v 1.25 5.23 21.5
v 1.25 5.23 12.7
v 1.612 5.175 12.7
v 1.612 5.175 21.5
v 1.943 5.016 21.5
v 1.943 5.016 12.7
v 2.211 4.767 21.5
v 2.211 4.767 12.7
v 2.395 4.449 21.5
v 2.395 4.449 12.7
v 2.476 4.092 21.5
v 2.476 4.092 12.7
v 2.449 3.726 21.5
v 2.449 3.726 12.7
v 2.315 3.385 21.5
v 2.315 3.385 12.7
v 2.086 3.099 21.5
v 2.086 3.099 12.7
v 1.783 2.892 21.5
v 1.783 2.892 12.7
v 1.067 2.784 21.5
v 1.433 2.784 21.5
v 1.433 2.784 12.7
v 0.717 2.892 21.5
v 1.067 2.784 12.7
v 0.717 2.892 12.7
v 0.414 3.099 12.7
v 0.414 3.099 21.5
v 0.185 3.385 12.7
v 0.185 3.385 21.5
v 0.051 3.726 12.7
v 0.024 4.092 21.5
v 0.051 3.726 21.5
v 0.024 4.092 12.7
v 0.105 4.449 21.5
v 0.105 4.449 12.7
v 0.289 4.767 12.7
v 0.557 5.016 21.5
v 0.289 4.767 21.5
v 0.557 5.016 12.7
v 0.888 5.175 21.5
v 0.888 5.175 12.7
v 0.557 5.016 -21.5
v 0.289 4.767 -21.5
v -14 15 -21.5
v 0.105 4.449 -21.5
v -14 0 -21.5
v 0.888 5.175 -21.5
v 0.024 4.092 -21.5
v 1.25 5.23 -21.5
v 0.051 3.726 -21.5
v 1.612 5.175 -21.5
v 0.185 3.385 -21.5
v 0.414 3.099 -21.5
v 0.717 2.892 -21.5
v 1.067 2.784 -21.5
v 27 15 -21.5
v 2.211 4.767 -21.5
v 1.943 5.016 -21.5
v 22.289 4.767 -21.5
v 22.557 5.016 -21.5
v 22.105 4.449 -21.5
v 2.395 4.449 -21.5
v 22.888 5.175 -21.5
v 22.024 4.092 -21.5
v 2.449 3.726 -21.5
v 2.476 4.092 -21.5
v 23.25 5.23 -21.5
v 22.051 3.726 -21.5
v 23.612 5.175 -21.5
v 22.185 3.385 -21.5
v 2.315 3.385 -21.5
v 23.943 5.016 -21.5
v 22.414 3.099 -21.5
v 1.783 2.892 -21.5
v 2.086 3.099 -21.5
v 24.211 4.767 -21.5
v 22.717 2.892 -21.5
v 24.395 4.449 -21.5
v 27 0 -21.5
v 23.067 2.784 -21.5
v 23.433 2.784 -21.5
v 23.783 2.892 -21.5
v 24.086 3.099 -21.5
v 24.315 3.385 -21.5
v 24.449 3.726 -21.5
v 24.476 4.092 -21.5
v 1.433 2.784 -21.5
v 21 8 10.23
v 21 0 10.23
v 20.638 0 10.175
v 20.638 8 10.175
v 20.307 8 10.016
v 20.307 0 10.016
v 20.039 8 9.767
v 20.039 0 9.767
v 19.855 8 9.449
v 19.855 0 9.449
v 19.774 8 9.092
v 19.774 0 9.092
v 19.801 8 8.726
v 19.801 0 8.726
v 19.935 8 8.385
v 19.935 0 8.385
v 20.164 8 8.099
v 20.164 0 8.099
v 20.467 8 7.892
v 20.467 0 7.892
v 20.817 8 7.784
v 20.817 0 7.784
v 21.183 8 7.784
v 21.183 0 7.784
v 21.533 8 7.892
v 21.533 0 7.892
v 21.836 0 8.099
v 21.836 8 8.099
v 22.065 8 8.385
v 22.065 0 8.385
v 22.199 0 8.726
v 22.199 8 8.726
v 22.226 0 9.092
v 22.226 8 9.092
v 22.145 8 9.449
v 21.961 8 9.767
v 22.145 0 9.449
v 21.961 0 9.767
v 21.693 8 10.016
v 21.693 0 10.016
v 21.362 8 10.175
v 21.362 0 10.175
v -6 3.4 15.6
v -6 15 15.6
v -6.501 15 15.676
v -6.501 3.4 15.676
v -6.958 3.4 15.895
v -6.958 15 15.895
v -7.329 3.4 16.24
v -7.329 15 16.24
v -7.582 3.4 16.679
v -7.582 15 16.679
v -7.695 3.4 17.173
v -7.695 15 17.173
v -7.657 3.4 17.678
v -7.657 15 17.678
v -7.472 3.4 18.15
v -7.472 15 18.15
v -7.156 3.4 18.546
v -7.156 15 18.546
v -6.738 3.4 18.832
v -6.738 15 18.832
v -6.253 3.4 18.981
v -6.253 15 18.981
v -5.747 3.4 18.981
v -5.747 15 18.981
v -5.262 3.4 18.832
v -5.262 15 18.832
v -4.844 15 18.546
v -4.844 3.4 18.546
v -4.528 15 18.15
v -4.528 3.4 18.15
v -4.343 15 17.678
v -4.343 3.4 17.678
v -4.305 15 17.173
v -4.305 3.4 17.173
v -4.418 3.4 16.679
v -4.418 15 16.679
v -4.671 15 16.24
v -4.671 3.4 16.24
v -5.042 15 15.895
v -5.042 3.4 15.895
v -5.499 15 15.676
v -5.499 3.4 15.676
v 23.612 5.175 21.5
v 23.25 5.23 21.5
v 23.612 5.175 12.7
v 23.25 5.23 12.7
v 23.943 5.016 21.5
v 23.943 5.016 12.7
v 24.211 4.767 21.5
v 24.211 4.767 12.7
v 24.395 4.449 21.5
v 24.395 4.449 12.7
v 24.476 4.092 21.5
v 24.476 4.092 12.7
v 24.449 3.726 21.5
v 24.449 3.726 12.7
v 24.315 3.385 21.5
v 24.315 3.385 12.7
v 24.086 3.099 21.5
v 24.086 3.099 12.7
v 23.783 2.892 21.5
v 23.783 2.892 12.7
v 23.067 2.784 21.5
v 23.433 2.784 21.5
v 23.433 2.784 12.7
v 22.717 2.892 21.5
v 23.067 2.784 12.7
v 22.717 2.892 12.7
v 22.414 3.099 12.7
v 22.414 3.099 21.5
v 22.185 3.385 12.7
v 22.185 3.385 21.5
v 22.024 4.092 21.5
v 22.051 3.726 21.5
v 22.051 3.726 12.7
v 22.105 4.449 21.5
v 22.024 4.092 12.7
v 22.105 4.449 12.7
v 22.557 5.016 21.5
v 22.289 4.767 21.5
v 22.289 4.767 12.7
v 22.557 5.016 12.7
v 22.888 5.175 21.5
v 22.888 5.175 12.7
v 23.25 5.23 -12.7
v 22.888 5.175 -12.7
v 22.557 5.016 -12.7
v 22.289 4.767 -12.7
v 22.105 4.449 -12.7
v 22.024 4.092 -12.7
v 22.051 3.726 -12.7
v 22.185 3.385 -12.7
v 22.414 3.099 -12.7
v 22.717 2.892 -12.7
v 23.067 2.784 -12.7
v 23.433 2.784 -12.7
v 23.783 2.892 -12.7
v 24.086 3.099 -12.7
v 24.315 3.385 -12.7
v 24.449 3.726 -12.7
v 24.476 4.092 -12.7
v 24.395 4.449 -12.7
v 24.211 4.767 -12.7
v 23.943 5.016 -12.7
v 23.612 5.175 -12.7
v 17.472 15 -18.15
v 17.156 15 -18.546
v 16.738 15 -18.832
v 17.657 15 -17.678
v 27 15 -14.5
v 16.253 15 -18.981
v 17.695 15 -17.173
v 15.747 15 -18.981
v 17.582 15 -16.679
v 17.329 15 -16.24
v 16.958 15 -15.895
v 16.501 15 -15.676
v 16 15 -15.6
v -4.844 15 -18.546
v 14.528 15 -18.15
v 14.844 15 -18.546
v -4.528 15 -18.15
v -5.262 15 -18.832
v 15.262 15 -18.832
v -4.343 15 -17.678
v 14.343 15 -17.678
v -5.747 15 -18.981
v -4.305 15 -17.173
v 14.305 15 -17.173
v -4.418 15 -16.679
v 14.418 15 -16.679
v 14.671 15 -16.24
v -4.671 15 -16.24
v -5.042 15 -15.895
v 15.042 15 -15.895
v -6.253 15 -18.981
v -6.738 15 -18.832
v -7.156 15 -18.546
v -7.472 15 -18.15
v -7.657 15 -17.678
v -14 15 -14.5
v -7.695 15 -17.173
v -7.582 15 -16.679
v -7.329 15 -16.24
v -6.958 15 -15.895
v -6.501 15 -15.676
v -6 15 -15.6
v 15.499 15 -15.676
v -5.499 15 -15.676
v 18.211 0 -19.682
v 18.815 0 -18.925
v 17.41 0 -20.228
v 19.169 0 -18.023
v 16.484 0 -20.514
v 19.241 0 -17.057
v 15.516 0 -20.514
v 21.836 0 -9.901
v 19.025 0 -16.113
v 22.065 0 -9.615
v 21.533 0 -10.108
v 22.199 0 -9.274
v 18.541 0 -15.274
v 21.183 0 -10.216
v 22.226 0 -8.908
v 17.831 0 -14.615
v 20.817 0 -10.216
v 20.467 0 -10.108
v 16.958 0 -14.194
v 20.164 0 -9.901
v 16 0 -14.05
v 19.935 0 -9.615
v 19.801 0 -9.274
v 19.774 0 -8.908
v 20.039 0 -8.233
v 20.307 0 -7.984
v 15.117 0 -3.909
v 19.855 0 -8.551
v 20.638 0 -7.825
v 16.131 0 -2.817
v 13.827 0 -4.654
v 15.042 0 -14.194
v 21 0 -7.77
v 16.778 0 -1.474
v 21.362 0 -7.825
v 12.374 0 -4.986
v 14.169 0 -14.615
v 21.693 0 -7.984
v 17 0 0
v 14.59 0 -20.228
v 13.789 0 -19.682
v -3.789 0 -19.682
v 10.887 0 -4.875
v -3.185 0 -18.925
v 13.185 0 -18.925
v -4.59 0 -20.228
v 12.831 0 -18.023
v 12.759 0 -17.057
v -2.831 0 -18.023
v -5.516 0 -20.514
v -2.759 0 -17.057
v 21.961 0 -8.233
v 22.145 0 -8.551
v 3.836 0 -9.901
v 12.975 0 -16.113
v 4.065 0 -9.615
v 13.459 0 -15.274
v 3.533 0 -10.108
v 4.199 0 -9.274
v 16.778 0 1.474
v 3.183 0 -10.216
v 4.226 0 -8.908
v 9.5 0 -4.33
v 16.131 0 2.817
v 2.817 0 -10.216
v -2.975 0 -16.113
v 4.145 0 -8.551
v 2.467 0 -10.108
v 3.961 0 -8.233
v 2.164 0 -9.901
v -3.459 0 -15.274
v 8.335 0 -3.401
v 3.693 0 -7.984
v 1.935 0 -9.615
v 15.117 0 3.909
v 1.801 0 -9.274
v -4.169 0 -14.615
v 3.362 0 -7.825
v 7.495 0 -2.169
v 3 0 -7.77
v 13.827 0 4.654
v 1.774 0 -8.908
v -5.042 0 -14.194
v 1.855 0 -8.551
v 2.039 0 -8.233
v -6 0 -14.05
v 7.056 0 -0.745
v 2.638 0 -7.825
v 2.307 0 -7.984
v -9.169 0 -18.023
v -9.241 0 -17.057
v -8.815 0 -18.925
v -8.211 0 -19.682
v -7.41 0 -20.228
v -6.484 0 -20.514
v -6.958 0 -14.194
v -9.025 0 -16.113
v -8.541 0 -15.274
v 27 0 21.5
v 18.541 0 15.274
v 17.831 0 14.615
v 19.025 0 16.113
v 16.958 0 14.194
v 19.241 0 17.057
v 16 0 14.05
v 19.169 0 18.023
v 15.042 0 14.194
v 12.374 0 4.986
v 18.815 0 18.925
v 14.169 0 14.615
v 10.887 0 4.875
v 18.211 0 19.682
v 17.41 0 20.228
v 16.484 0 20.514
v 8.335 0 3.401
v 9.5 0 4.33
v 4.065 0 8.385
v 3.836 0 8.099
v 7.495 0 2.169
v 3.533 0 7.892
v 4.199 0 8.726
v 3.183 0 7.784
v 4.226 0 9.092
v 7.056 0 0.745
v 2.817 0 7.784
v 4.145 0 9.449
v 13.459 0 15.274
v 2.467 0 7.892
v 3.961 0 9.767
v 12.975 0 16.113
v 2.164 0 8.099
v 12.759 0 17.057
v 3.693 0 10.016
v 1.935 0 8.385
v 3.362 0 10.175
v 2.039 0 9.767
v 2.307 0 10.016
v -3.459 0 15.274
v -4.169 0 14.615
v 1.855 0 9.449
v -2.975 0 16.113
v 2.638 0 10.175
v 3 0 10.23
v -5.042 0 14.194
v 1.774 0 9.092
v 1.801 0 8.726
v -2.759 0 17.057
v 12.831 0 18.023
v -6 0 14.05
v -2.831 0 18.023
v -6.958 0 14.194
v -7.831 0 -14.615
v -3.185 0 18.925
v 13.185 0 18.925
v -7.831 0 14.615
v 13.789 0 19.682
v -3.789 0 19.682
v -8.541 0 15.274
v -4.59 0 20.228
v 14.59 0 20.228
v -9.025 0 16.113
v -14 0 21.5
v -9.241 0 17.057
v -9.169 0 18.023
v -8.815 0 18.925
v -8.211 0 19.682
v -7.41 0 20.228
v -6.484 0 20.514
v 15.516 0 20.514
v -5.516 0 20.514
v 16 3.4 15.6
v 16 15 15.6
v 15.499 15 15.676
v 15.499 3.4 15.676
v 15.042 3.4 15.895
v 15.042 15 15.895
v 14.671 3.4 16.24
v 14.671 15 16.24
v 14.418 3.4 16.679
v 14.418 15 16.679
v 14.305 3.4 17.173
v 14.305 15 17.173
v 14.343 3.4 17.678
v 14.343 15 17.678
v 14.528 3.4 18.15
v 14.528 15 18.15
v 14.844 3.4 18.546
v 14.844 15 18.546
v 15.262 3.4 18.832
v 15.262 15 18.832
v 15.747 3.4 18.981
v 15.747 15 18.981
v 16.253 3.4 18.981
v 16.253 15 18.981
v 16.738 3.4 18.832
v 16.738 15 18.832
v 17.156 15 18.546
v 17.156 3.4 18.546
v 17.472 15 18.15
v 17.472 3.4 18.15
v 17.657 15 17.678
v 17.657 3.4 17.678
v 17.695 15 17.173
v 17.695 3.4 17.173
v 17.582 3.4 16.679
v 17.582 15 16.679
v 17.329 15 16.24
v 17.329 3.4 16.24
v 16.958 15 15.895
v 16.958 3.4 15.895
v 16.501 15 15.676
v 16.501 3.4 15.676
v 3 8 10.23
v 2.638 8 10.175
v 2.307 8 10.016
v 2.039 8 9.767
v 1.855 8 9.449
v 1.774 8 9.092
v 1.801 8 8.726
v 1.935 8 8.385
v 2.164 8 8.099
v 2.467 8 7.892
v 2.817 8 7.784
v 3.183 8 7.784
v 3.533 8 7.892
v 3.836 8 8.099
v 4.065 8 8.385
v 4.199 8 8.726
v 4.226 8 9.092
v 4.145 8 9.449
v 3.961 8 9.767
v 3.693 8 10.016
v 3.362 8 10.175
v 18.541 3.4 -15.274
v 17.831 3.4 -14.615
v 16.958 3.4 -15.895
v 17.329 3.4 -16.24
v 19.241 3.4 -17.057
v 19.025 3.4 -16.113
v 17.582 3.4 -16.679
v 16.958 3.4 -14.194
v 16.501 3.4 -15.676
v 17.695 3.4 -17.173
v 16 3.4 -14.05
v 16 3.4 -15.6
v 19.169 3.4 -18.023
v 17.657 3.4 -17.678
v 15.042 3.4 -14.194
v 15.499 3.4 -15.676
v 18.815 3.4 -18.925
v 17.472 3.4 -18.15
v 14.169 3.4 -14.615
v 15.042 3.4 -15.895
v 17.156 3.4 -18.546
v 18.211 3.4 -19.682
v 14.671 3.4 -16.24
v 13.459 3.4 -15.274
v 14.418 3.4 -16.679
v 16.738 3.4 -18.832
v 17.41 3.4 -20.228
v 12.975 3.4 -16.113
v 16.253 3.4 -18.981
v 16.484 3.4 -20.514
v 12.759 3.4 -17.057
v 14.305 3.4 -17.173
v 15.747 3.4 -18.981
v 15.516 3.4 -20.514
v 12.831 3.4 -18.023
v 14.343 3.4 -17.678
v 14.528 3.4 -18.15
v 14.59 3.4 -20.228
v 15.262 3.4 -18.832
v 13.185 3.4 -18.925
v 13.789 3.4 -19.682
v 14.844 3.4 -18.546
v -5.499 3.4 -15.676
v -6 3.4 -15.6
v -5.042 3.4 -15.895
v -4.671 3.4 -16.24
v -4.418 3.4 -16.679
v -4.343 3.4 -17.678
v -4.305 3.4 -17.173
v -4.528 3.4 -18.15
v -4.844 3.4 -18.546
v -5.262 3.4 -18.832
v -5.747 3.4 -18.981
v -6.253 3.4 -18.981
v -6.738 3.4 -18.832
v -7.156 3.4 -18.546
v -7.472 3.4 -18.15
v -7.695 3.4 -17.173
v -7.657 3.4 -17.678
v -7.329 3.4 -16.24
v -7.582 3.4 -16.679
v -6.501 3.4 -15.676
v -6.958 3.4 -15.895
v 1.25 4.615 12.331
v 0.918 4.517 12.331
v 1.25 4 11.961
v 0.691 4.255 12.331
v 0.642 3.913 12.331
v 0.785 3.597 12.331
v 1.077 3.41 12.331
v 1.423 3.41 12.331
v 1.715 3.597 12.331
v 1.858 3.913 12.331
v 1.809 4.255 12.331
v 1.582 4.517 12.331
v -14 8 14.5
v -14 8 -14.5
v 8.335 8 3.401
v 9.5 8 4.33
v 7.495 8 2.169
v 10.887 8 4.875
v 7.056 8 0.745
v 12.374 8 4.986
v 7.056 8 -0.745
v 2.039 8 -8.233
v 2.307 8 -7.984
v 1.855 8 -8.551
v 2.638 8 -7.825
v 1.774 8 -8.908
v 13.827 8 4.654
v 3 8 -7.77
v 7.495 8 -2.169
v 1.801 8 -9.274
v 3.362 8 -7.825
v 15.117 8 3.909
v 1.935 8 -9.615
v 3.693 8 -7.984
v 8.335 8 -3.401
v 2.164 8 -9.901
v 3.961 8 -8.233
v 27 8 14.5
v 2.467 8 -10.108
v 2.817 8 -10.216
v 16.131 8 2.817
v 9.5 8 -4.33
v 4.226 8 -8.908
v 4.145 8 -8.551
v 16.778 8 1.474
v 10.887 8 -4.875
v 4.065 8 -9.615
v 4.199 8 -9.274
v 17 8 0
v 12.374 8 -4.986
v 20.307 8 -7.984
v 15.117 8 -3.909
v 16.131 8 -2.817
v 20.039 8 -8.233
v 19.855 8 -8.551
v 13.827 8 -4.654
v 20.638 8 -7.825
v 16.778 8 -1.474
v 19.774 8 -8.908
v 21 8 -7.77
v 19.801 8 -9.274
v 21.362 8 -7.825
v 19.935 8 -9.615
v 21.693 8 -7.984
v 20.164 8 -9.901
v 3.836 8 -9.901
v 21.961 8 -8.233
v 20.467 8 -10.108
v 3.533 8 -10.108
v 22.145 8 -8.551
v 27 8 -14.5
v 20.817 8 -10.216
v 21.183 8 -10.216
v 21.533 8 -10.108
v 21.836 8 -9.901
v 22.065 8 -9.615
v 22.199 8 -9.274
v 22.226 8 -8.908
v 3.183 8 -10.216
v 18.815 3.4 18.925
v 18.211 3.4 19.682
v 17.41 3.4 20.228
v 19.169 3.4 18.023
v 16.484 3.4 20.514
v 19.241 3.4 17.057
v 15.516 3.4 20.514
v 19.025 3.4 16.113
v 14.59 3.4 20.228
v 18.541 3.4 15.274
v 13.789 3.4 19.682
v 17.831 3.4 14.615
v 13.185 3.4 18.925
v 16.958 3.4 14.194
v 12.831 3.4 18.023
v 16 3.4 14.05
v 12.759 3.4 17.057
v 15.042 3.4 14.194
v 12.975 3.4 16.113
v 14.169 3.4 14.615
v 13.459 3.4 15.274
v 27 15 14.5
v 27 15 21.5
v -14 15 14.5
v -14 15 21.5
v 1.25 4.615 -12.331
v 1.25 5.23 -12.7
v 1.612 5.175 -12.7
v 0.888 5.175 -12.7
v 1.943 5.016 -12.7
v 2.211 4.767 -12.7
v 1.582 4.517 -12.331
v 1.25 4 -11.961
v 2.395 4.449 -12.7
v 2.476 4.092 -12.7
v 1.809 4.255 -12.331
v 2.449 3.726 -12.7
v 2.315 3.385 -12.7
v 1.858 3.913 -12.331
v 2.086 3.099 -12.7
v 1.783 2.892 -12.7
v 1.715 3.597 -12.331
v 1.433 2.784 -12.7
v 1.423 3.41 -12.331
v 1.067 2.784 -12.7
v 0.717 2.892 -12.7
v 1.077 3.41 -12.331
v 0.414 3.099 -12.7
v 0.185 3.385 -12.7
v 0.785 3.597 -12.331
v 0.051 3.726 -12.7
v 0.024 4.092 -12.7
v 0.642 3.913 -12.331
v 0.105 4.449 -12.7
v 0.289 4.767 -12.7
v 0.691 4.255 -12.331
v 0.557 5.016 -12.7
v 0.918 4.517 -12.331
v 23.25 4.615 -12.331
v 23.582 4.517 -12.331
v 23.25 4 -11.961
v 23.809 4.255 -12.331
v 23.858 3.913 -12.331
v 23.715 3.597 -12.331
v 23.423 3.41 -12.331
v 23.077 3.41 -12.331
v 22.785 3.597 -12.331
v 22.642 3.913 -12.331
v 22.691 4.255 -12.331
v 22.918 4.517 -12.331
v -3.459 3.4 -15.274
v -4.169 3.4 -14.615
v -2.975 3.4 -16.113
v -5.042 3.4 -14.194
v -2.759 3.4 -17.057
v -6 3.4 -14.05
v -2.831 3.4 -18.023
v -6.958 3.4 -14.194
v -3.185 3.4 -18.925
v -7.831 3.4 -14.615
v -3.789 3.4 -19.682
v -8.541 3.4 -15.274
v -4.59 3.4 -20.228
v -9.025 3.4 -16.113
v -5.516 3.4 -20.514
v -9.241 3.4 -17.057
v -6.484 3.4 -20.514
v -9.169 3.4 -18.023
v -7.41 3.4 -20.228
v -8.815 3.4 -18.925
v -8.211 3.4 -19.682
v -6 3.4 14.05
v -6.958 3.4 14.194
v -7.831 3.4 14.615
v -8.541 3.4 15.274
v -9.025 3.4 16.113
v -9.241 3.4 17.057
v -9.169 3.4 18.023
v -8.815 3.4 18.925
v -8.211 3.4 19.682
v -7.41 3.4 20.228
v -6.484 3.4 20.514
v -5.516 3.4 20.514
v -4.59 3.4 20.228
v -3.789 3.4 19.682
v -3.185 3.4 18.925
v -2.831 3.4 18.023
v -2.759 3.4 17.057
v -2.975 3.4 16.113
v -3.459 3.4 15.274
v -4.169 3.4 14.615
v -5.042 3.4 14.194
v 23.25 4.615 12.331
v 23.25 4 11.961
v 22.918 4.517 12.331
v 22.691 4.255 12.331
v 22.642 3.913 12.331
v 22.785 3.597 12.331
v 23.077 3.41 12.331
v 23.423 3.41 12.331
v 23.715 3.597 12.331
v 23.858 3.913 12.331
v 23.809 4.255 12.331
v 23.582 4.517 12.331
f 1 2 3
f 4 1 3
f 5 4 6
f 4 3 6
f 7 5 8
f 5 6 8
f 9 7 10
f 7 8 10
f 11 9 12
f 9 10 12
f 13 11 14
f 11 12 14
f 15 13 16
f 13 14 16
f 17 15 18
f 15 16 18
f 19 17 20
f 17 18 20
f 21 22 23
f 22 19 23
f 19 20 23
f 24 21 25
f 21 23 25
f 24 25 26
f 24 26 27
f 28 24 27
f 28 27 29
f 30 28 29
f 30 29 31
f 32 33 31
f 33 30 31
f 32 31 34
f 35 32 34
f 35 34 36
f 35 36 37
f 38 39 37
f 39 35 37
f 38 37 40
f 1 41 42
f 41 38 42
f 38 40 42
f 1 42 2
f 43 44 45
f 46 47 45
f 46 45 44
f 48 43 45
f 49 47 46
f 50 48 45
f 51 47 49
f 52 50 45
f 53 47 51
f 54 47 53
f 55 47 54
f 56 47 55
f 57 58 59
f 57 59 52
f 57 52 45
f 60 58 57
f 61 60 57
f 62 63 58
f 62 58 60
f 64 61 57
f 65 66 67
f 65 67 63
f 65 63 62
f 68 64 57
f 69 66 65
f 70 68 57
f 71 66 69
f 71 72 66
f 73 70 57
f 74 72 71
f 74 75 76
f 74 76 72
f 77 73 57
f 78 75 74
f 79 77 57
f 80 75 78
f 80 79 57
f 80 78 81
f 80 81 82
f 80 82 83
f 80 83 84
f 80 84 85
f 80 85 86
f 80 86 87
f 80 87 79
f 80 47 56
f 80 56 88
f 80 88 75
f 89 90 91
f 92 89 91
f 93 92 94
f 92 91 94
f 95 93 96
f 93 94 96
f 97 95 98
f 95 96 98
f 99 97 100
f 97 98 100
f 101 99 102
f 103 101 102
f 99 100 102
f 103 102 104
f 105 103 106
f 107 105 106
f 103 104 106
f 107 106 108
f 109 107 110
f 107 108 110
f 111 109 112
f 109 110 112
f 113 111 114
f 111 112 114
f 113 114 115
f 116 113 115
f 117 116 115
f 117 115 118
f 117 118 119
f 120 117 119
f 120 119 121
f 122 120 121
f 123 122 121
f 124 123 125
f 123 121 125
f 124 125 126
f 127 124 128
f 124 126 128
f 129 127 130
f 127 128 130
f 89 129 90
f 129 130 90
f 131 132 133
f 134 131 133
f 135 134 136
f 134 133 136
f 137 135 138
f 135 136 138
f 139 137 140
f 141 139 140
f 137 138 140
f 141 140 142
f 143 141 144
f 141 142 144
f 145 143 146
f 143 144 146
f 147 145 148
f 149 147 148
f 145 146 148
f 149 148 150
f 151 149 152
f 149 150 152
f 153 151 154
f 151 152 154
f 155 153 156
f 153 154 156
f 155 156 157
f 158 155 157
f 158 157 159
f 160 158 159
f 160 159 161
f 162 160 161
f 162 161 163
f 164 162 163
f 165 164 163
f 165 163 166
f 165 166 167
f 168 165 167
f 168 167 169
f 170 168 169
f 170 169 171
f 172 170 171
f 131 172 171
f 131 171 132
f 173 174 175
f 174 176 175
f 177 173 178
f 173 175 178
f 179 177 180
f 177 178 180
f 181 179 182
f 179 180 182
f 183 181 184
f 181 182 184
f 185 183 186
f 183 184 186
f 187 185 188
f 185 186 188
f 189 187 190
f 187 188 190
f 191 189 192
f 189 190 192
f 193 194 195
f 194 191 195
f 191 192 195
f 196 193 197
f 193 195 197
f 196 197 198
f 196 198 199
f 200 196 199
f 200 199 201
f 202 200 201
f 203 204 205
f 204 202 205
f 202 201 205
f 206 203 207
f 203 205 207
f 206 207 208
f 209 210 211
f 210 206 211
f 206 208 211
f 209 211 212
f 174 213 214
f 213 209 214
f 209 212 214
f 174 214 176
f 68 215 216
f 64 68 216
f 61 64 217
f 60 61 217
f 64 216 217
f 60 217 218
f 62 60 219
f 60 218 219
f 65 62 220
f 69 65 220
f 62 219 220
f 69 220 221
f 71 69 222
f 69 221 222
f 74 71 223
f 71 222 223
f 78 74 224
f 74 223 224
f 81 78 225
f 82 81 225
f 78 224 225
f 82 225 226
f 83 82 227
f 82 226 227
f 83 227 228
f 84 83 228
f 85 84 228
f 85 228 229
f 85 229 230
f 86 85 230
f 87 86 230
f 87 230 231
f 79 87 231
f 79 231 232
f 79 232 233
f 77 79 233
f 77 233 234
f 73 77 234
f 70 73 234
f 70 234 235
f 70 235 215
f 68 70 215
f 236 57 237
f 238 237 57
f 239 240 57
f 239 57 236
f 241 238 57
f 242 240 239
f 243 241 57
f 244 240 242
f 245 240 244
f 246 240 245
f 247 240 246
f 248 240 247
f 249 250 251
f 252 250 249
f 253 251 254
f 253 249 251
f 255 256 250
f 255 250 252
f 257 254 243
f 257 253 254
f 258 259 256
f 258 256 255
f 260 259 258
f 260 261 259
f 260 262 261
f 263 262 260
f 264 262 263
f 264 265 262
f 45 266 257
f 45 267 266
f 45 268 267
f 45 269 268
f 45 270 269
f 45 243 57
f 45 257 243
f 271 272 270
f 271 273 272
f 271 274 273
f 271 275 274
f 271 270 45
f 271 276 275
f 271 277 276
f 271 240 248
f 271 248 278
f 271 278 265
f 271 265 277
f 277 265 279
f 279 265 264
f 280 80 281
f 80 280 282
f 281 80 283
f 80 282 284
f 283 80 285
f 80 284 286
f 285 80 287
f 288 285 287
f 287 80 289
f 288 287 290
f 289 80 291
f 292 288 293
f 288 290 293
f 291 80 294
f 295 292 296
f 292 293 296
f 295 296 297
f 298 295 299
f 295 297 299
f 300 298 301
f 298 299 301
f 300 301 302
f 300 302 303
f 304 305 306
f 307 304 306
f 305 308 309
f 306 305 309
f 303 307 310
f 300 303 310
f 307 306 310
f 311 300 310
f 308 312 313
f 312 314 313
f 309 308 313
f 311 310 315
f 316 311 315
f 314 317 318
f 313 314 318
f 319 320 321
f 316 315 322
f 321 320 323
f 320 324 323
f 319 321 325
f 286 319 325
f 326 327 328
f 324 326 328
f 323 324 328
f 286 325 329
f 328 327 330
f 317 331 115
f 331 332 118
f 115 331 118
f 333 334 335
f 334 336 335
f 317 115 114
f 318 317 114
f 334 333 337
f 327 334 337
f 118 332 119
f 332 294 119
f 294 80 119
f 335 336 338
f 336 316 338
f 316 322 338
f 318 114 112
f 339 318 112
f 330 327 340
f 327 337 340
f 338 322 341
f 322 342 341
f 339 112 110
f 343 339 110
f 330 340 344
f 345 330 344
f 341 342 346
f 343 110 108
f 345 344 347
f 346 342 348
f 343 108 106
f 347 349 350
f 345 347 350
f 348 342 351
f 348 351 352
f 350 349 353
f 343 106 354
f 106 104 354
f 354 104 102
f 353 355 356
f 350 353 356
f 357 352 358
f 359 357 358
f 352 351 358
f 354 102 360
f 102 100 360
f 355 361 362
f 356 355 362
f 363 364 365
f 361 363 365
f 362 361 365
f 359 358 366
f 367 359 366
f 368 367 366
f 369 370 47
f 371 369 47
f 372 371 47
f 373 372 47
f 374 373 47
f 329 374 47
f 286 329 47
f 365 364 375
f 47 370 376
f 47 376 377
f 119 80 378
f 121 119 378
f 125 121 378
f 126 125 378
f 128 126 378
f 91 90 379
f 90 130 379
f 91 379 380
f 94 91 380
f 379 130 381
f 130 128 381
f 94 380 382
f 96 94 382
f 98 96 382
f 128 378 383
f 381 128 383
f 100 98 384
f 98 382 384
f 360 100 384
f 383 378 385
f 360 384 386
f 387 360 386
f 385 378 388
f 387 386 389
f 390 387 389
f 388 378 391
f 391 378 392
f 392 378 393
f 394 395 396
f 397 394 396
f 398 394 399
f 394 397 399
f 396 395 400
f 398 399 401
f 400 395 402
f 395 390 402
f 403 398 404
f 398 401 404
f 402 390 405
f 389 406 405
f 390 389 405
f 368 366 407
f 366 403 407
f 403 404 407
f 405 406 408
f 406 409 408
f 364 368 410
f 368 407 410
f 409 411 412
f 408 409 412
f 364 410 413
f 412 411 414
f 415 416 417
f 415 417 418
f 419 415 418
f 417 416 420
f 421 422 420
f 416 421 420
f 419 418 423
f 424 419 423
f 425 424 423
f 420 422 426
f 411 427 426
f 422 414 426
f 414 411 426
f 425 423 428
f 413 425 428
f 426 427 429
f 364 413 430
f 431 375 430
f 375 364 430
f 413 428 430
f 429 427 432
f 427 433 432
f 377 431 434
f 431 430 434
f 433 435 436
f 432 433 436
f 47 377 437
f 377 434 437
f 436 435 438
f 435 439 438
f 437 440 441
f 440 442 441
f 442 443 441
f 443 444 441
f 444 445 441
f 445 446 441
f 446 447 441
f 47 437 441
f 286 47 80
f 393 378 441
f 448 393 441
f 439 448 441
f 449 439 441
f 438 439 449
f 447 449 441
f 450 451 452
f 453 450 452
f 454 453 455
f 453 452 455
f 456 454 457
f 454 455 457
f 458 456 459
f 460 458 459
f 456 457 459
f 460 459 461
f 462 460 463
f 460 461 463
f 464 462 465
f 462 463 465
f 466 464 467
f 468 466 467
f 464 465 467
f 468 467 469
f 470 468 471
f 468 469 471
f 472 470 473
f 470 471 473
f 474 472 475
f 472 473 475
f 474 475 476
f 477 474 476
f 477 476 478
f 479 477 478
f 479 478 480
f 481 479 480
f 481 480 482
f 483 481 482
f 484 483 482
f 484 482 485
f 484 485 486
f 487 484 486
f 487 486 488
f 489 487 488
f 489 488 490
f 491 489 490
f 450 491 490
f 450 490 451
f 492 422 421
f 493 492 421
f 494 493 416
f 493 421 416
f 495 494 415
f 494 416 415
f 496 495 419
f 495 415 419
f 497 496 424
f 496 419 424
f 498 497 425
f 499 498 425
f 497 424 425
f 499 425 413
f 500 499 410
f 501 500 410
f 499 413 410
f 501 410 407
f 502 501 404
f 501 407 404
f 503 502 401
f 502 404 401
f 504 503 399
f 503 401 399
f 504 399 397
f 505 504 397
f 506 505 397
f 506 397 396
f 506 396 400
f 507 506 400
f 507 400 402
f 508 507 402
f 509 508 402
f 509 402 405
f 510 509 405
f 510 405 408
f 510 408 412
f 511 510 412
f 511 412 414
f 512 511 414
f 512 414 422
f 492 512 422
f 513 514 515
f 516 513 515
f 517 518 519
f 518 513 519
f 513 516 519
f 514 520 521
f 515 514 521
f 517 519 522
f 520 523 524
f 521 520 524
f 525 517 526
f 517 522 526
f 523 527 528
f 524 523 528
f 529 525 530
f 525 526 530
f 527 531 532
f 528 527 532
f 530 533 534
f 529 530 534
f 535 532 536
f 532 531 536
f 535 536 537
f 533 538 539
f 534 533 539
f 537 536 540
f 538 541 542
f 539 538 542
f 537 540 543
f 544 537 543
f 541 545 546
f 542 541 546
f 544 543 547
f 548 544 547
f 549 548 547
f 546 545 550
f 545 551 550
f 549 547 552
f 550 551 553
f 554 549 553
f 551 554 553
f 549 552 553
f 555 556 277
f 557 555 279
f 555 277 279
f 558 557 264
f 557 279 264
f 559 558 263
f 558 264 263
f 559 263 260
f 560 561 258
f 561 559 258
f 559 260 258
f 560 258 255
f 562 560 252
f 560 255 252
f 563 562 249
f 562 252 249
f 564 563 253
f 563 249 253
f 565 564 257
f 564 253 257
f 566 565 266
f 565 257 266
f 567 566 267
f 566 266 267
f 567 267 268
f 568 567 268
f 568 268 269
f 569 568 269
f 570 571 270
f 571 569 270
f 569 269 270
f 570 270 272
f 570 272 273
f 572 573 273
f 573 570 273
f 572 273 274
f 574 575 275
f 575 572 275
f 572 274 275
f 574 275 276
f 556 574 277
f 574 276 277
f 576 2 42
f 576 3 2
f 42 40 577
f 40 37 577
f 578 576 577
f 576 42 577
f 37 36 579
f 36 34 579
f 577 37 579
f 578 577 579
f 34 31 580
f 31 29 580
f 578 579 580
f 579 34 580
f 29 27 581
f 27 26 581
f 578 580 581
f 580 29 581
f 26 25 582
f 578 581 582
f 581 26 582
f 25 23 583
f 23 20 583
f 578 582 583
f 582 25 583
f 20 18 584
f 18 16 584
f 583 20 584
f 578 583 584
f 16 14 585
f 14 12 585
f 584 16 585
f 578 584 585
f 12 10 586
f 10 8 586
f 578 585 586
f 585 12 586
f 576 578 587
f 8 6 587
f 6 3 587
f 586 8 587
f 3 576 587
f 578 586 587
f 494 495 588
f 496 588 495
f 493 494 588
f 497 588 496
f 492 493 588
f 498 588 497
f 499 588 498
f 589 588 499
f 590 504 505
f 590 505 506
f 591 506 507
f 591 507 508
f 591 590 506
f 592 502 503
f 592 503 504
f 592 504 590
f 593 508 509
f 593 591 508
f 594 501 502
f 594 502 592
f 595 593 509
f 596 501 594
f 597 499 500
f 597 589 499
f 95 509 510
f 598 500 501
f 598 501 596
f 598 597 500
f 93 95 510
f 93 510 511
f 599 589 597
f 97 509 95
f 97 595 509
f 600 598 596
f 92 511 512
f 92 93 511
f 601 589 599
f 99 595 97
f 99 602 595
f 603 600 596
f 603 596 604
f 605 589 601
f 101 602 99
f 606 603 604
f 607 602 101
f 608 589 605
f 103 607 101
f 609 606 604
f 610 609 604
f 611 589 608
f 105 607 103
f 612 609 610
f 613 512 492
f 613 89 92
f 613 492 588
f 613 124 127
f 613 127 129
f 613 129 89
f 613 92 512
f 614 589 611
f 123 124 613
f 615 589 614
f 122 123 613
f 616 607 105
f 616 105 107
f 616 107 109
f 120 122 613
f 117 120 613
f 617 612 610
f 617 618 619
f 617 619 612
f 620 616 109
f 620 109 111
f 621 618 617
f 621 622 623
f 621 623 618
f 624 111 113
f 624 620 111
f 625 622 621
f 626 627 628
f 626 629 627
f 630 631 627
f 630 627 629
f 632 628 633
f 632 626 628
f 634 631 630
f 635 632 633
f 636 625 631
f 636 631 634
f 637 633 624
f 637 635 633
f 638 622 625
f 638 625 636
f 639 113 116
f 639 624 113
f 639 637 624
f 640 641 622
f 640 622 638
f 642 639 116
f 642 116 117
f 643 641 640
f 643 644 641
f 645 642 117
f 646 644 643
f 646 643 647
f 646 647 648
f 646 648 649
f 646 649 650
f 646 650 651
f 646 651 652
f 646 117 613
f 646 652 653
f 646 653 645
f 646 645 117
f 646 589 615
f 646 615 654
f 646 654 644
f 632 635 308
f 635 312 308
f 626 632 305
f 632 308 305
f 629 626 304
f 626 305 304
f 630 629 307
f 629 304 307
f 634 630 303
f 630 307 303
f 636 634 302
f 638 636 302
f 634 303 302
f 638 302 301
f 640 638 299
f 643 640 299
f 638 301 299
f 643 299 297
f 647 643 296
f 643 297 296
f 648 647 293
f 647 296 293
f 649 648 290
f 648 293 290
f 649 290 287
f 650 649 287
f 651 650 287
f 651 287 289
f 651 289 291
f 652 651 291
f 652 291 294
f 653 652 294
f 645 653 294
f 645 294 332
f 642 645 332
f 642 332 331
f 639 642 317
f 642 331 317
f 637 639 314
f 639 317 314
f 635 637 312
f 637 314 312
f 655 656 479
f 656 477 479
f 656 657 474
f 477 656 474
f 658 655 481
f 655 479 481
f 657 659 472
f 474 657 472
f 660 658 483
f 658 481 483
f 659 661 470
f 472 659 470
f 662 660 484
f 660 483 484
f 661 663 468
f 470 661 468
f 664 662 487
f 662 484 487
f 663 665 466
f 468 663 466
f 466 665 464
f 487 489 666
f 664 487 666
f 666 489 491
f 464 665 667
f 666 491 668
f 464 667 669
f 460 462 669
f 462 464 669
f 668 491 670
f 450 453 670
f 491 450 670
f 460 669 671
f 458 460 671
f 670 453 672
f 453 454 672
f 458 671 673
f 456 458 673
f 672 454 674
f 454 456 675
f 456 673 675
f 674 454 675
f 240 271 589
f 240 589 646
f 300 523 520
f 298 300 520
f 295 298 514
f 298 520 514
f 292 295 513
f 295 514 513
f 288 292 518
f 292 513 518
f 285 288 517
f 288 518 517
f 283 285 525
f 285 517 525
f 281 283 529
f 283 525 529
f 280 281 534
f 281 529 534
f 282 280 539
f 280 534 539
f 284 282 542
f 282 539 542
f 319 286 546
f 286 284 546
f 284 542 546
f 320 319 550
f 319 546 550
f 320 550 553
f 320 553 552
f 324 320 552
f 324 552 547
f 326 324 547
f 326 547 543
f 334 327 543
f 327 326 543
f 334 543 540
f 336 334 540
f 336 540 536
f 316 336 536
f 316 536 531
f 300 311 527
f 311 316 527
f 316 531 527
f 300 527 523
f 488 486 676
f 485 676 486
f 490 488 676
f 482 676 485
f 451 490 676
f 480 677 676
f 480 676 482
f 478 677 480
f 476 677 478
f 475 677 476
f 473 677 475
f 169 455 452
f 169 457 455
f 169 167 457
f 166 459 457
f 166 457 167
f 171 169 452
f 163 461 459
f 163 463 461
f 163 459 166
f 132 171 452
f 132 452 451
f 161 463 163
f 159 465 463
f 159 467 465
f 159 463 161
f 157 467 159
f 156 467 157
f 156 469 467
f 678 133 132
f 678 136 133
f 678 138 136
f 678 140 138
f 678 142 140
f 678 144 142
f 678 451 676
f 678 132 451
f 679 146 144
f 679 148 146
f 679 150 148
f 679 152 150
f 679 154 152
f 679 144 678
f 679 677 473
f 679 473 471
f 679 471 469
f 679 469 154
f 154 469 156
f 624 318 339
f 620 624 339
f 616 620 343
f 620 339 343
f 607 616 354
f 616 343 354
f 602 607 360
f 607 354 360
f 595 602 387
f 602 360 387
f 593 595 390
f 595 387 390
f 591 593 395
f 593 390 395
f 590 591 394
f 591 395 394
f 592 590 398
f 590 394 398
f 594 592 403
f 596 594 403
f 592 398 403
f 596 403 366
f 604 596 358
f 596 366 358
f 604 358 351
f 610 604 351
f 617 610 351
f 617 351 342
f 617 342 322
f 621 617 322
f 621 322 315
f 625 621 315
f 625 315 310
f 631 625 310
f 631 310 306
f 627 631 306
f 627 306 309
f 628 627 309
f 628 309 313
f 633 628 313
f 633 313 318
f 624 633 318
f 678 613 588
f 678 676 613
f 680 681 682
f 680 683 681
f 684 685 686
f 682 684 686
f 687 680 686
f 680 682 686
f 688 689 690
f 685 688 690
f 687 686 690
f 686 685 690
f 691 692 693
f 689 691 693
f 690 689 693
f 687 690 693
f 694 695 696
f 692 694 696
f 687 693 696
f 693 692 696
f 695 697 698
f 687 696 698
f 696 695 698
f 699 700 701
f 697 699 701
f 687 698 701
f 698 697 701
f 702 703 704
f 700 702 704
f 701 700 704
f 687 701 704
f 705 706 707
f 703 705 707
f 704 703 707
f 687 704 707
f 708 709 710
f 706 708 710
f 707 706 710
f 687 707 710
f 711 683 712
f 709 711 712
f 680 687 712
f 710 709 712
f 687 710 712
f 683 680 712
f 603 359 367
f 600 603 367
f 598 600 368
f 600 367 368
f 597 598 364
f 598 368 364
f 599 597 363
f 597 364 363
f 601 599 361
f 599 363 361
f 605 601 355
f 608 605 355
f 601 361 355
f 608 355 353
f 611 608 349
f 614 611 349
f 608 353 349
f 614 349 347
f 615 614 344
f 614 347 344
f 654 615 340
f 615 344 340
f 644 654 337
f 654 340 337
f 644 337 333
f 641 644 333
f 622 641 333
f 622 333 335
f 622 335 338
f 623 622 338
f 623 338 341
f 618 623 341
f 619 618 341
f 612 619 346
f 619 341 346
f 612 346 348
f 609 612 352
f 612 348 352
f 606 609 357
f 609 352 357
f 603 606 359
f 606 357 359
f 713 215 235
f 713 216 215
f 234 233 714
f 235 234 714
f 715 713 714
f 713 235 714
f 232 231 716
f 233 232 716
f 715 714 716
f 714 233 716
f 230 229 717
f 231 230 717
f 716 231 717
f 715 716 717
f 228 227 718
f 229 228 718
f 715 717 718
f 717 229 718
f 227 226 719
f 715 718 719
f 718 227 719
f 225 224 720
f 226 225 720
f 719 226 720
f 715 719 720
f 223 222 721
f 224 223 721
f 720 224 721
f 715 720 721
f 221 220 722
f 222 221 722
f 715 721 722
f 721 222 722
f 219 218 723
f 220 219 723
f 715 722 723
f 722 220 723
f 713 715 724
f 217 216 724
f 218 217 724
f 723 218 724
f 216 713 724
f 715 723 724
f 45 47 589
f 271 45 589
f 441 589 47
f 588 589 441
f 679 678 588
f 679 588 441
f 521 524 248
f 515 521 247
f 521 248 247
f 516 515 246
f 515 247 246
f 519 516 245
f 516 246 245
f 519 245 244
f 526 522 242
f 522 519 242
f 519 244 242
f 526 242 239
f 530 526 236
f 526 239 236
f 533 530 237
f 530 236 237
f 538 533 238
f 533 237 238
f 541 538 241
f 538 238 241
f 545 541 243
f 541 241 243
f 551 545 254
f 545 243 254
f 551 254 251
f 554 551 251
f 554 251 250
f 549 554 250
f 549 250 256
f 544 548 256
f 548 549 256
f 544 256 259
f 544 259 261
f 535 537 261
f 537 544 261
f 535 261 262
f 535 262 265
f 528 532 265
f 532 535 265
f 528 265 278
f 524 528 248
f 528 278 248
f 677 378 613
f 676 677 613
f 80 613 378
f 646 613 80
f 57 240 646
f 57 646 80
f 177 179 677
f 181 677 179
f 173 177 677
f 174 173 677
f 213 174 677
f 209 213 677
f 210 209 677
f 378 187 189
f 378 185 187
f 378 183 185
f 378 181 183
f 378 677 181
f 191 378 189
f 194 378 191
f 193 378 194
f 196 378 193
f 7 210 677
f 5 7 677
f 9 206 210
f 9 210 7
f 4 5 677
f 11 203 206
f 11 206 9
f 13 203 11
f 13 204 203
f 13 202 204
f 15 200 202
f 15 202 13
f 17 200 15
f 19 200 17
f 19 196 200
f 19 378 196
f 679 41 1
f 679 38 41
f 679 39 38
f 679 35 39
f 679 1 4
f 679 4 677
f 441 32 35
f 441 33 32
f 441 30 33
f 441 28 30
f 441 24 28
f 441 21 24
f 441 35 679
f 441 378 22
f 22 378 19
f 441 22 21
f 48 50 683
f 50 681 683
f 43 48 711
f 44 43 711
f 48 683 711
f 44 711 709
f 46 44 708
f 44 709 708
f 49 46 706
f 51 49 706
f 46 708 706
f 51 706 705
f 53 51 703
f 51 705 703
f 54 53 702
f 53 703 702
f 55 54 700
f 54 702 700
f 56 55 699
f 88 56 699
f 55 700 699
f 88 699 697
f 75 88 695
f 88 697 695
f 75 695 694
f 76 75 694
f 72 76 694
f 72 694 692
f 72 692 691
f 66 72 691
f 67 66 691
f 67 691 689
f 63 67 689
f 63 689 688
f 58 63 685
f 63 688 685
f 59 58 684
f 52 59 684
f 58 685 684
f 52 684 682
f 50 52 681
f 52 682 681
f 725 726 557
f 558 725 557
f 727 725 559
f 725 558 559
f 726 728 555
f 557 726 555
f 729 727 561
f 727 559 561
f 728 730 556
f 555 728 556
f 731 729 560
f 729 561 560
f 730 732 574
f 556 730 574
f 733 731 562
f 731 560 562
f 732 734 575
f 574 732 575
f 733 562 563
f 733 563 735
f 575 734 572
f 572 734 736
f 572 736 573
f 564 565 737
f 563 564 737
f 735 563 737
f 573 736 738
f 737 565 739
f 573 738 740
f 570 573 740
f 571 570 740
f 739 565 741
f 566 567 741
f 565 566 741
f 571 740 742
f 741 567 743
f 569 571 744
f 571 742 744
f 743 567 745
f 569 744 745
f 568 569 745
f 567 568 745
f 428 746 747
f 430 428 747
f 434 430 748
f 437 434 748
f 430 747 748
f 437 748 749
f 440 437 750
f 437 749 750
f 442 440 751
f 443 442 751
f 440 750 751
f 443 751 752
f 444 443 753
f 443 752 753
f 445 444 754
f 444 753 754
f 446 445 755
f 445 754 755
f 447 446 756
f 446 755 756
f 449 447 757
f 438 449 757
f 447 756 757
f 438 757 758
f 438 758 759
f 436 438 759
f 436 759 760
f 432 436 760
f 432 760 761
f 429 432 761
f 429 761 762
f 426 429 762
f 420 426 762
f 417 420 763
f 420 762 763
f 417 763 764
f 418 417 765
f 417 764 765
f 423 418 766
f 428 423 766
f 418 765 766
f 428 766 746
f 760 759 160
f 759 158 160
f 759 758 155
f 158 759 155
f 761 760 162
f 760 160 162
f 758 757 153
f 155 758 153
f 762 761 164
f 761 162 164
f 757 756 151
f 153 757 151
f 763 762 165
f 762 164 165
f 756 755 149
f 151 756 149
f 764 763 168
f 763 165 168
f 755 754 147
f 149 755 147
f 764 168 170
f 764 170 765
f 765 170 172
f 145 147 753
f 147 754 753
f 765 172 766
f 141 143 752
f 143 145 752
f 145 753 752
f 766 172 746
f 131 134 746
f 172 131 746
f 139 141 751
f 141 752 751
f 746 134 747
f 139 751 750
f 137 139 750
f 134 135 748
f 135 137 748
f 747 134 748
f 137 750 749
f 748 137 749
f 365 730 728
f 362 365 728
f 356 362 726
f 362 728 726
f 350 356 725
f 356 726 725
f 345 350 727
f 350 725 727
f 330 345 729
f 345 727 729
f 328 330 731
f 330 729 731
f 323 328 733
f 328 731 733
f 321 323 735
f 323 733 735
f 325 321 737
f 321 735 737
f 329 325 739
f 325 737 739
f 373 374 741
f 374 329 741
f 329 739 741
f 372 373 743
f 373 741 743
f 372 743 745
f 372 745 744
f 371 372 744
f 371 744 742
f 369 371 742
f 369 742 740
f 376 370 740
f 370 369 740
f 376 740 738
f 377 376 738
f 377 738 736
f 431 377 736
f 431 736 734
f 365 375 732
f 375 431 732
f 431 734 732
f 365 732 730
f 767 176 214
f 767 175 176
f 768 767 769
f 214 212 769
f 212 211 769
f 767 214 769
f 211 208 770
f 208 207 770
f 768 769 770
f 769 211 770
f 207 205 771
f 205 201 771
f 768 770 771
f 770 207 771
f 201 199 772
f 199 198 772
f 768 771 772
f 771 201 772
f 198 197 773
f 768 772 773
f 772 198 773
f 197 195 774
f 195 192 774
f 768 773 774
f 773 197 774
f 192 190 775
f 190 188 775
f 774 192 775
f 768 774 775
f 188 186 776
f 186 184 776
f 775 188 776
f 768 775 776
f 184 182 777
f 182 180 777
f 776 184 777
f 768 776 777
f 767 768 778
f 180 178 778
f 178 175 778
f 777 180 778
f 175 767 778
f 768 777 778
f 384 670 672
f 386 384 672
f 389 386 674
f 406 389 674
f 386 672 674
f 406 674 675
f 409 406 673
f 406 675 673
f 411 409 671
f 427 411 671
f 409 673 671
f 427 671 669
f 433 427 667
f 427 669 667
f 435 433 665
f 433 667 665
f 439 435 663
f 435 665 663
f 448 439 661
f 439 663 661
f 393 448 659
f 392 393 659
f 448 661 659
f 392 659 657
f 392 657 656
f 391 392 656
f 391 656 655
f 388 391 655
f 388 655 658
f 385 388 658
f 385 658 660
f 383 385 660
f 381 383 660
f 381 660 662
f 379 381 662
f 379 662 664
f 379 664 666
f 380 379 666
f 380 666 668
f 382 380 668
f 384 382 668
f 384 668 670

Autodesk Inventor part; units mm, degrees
ref_plane "YZ Plane" through (0, 0, 0) normal (1, 0, 0) x (0, 1, 0)
sketch "Skizze1" plane through (0, 0, 0) normal (0, 1, 0) x (-1, 0, 0)
  line L0 (-34, 21.5) -> (34, 21.5)
  line L1 (34, 21.5) -> (34, -21.5)
  line L2 (34, -21.5) -> (-34, -21.5)
  line L3 (-34, -21.5) -> (-34, 21.5)
  line L4 (-34, 21.5) -> (34, -21.5) construction
  line L5 (34, 21.5) -> (-34, -21.5) construction
  point P0 (0, 0)
  dimension "d0" = 43
  dimension "d1" = 68
extrude "Extrusion1" add sketch "Skizze1" along normal blind 15
sketch "Skizze2" plane through (0, 15, 0) normal (0, 1, 0) x (1, 0, 0)
  line L0 (-34, -21.5) -> (34, -21.5) projected
  line L1 (34, -21.5) -> (34, 21.5) projected
  line L2 (34, 21.5) -> (-34, 21.5) projected
  line L3 (-34, 21.5) -> (-34, -21.5) projected
  line L4 (-34, 14.5) -> (27, 14.5)
  line L5 (27, 14.5) -> (27, -14.5)
  line L6 (27, -14.5) -> (-34, -14.5)
  line L7 (-34, -14.5) -> (-34, 14.5)
  point P0 (0, 0)
  dimension "d4" = 29
  dimension "d5" = 14.5
  dimension "d9" = 7
  dimension "d10" = 7
extrude "Extrusion2" cut sketch "Skizze2" against normal blind 7 contours L3 L4 L5 L6
sketch "Skizze3" plane through (0, 0, 0) normal (0, -1, 0) x (1, 0, 0)
  line L0 (-34, 14.5) -> (-34, -14.5) projected
  line L1 (27, 14.5) -> (-34, 14.5) projected
  line L2 (27, -14.5) -> (27, 14.5) projected
  line L3 (-34, -14.5) -> (27, -14.5) projected
  circle A0 centre (12, 0) radius 5
  line L4 (0, 0) -> (50.6239, 0) construction
  point P0 (16, 17.3)
  dimension "d11" = 11
  dimension "d12" = 17.3
  dimension "d24" = 10
  dimension "d27" = 4
hole "Bohrung1" at (16, 0, 17.3) direction (0, 1, 0) diameter 3.4 end through all counterbore diameter 6.5 counterbore depth 3.4 clearance for "Inbusschraube ISO 4762" size "M3" standard "ISO"
pattern_linear "Rechteckige Anordnung1" count 3 spacing 22 along (-1, 0, 0) of "Bohrung1"
ref_plane "Arbeitsebene1" through (-34, 0, 0) normal (0, 0, 1) x (1, 0, 0)
mirror "Spiegeln1" about plane through (-34, 0, 0) normal (0, 0, 1) of "Bohrung1", "Rechteckige Anordnung1"
extrude "Extrusion3" cut sketch "Skizze3" against normal through all contours A0
sketch "Skizze4" plane through (0, 8, 0) normal (0, 1, 0) x (1, 0, 0)
  circle A0 centre (12, 0) radius 5 projected
  line L0 (-34, -14.5) -> (-34, 14.5) projected
  line L1 (27, -14.5) -> (-34, -14.5) projected
  line L2 (27, 14.5) -> (27, -14.5) projected
  line L3 (-34, 14.5) -> (27, 14.5) projected
  line L4 (21, -9) -> (3, -9)
  line L5 (3, -9) -> (3, 9)
  line L6 (3, 9) -> (21, 9)
  line L7 (21, 9) -> (21, -9)
  line L8 (21, -9) -> (3, 9) construction
  line L9 (3, -9) -> (21, 9) construction
  point P0 (0, 0)
  dimension "d28" = 18
  dimension "d29" = 18
hole "Bohrung2" at (3, 8, 9) at (3, 8, -9) at (21, 8, -9) at (21, 8, 9) direction (0, -1, 0) diameter 2.459 depth 8.8 tip angle 118 thread size "M3x0.5" class "6H" standard "ISO Metric profile"
sketch "Skizze5" plane through (0, 15, 0) normal (0, 1, 0) x (1, 0, 0)
  circle A0 centre (-28, 17.3) radius 1.7 projected
  circle A1 centre (-6, 17.3) radius 1.7 projected
  circle A2 centre (16, 17.3) radius 1.7 projected
  circle A3 centre (-28, -17.3) radius 1.7 projected
  circle A4 centre (-6, -17.3) radius 1.7 projected
  circle A5 centre (16, -17.3) radius 1.7 projected
  line L0 (27, -14.5) -> (-34, -14.5) projected
  line L1 (-34, -14.5) -> (-34, -21.5) projected
  line L2 (-34, -21.5) -> (34, -21.5) projected
  line L3 (34, -21.5) -> (34, 21.5) projected
  line L4 (34, 21.5) -> (-34, 21.5) projected
  line L5 (-34, 21.5) -> (-34, 14.5) projected
  line L6 (-34, 14.5) -> (27, 14.5) projected
  line L7 (27, 14.5) -> (27, -14.5) projected
  line L8 (-34, 21.5) -> (34, 21.5) projected
  line L9 (34, -21.5) -> (27, -21.5)
  line L10 (27, -21.5) -> (27, 21.5)
  line L11 (27, 21.5) -> (34, 21.5)
  line L12 (34, 21.5) -> (34, -21.5)
  point P0 (0, 0)
extrude "Extrusion4" cut sketch "Skizze5" against normal through all contours L7 L10 L4 L3 L2
sketch "Skizze6" plane through (-34, 0, -21.5) normal (-1, 0, 0) x (0, 0, 1)
  line L0 (36, 15) -> (36, 8) projected
  line L1 (36, 8) -> (7, 8) projected
  line L2 (7, 8) -> (7, 15) projected
  line L3 (0, 15) -> (7, 15) projected
  line L4 (0, 0) -> (0, 15) projected
  line L5 (43, 0) -> (0, 0) projected
  line L6 (43, 0) -> (43, 15) projected
  line L7 (36, 15) -> (43, 15) projected
  point P0 (21.5, 0)
extrude "Extrusion5" cut sketch "Skizze6" against normal blind 20
sketch "Skizze7" plane through (27, 0, -21.5) normal (0, 0, -1) x (-1, 0, 0)
  line L0 (34.7, 3.4) -> (31.3, 3.4) projected
  line L1 (36.25, 3.4) -> (29.75, 3.4) projected
  line L2 (31.3, 15) -> (34.7, 15) projected
  line L3 (9.3, 15) -> (12.7, 15) projected
  line L4 (14.25, 3.4) -> (7.75, 3.4) projected
  line L5 (34.7, 15) -> (34.7, 3.4)
  line L6 (34.7, 3.4) -> (34.7, 15) projected
  line L7 (31.3, 15) -> (31.3, 3.4)
  line L8 (9.3, 3.4) -> (12.7, 3.4) projected
  line L9 (12.7, 15) -> (12.7, 3.4)
  line L10 (9.3, 15) -> (9.3, 3.4)
  line L11 (0, 8) -> (41, 8) projected
  line L12 (29.75, 3.4) -> (29.75, 0)
  line L13 (29.75, 0) -> (29.75, 3.4) projected
  line L14 (29.75, 3.4) -> (36.25, 3.4) projected
  line L15 (36.25, 3.4) -> (36.25, 0)
  line L16 (36.25, 0) -> (36.25, 3.4) projected
  line L17 (14.25, 3.4) -> (14.25, 0)
  line L18 (14.25, 3.4) -> (14.25, 0) projected
  line L19 (7.75, 3.4) -> (14.25, 3.4) projected
  line L20 (7.75, 3.4) -> (7.75, 0)
  line L21 (7.75, 3.4) -> (7.75, 0) projected
  line L22 (41, 0) -> (0, 0) projected
  point P0 (27, 0)
  point P1 (25.75, 4)
  point P2 (3.75, 4)
  dimension "d41" = 8
  dimension "d42" = 4
  dimension "d43" = 4
  dimension "d44" = 4
  dimension "d45" = 4
hole "Bohrung3" at (1.25, 4, -21.5) at (23.25, 4, -21.5) direction (0, 0, 1) diameter 2.459 depth 8.8 tip angle 118 thread size "M3x0.5" class "6H" standard "ISO Metric profile"
ref_plane "Arbeitsebene2" through (27, 0, 0) normal (0, 0, -1) x (-1, 0, 0)
mirror "Spiegeln2" about plane through (27, 0, 0) normal (0, 0, -1) of "Bohrung3"
equation "\"d5\" = 0.5 * d4"
equation "\"d10\" = d9"
equation "\"d29\" = d28"
equation "\"d42\" = 0.5 * d41"
equation "\"d43\" = d42"
properties part number "connection_hand_2" material "Aluminium 6061"
